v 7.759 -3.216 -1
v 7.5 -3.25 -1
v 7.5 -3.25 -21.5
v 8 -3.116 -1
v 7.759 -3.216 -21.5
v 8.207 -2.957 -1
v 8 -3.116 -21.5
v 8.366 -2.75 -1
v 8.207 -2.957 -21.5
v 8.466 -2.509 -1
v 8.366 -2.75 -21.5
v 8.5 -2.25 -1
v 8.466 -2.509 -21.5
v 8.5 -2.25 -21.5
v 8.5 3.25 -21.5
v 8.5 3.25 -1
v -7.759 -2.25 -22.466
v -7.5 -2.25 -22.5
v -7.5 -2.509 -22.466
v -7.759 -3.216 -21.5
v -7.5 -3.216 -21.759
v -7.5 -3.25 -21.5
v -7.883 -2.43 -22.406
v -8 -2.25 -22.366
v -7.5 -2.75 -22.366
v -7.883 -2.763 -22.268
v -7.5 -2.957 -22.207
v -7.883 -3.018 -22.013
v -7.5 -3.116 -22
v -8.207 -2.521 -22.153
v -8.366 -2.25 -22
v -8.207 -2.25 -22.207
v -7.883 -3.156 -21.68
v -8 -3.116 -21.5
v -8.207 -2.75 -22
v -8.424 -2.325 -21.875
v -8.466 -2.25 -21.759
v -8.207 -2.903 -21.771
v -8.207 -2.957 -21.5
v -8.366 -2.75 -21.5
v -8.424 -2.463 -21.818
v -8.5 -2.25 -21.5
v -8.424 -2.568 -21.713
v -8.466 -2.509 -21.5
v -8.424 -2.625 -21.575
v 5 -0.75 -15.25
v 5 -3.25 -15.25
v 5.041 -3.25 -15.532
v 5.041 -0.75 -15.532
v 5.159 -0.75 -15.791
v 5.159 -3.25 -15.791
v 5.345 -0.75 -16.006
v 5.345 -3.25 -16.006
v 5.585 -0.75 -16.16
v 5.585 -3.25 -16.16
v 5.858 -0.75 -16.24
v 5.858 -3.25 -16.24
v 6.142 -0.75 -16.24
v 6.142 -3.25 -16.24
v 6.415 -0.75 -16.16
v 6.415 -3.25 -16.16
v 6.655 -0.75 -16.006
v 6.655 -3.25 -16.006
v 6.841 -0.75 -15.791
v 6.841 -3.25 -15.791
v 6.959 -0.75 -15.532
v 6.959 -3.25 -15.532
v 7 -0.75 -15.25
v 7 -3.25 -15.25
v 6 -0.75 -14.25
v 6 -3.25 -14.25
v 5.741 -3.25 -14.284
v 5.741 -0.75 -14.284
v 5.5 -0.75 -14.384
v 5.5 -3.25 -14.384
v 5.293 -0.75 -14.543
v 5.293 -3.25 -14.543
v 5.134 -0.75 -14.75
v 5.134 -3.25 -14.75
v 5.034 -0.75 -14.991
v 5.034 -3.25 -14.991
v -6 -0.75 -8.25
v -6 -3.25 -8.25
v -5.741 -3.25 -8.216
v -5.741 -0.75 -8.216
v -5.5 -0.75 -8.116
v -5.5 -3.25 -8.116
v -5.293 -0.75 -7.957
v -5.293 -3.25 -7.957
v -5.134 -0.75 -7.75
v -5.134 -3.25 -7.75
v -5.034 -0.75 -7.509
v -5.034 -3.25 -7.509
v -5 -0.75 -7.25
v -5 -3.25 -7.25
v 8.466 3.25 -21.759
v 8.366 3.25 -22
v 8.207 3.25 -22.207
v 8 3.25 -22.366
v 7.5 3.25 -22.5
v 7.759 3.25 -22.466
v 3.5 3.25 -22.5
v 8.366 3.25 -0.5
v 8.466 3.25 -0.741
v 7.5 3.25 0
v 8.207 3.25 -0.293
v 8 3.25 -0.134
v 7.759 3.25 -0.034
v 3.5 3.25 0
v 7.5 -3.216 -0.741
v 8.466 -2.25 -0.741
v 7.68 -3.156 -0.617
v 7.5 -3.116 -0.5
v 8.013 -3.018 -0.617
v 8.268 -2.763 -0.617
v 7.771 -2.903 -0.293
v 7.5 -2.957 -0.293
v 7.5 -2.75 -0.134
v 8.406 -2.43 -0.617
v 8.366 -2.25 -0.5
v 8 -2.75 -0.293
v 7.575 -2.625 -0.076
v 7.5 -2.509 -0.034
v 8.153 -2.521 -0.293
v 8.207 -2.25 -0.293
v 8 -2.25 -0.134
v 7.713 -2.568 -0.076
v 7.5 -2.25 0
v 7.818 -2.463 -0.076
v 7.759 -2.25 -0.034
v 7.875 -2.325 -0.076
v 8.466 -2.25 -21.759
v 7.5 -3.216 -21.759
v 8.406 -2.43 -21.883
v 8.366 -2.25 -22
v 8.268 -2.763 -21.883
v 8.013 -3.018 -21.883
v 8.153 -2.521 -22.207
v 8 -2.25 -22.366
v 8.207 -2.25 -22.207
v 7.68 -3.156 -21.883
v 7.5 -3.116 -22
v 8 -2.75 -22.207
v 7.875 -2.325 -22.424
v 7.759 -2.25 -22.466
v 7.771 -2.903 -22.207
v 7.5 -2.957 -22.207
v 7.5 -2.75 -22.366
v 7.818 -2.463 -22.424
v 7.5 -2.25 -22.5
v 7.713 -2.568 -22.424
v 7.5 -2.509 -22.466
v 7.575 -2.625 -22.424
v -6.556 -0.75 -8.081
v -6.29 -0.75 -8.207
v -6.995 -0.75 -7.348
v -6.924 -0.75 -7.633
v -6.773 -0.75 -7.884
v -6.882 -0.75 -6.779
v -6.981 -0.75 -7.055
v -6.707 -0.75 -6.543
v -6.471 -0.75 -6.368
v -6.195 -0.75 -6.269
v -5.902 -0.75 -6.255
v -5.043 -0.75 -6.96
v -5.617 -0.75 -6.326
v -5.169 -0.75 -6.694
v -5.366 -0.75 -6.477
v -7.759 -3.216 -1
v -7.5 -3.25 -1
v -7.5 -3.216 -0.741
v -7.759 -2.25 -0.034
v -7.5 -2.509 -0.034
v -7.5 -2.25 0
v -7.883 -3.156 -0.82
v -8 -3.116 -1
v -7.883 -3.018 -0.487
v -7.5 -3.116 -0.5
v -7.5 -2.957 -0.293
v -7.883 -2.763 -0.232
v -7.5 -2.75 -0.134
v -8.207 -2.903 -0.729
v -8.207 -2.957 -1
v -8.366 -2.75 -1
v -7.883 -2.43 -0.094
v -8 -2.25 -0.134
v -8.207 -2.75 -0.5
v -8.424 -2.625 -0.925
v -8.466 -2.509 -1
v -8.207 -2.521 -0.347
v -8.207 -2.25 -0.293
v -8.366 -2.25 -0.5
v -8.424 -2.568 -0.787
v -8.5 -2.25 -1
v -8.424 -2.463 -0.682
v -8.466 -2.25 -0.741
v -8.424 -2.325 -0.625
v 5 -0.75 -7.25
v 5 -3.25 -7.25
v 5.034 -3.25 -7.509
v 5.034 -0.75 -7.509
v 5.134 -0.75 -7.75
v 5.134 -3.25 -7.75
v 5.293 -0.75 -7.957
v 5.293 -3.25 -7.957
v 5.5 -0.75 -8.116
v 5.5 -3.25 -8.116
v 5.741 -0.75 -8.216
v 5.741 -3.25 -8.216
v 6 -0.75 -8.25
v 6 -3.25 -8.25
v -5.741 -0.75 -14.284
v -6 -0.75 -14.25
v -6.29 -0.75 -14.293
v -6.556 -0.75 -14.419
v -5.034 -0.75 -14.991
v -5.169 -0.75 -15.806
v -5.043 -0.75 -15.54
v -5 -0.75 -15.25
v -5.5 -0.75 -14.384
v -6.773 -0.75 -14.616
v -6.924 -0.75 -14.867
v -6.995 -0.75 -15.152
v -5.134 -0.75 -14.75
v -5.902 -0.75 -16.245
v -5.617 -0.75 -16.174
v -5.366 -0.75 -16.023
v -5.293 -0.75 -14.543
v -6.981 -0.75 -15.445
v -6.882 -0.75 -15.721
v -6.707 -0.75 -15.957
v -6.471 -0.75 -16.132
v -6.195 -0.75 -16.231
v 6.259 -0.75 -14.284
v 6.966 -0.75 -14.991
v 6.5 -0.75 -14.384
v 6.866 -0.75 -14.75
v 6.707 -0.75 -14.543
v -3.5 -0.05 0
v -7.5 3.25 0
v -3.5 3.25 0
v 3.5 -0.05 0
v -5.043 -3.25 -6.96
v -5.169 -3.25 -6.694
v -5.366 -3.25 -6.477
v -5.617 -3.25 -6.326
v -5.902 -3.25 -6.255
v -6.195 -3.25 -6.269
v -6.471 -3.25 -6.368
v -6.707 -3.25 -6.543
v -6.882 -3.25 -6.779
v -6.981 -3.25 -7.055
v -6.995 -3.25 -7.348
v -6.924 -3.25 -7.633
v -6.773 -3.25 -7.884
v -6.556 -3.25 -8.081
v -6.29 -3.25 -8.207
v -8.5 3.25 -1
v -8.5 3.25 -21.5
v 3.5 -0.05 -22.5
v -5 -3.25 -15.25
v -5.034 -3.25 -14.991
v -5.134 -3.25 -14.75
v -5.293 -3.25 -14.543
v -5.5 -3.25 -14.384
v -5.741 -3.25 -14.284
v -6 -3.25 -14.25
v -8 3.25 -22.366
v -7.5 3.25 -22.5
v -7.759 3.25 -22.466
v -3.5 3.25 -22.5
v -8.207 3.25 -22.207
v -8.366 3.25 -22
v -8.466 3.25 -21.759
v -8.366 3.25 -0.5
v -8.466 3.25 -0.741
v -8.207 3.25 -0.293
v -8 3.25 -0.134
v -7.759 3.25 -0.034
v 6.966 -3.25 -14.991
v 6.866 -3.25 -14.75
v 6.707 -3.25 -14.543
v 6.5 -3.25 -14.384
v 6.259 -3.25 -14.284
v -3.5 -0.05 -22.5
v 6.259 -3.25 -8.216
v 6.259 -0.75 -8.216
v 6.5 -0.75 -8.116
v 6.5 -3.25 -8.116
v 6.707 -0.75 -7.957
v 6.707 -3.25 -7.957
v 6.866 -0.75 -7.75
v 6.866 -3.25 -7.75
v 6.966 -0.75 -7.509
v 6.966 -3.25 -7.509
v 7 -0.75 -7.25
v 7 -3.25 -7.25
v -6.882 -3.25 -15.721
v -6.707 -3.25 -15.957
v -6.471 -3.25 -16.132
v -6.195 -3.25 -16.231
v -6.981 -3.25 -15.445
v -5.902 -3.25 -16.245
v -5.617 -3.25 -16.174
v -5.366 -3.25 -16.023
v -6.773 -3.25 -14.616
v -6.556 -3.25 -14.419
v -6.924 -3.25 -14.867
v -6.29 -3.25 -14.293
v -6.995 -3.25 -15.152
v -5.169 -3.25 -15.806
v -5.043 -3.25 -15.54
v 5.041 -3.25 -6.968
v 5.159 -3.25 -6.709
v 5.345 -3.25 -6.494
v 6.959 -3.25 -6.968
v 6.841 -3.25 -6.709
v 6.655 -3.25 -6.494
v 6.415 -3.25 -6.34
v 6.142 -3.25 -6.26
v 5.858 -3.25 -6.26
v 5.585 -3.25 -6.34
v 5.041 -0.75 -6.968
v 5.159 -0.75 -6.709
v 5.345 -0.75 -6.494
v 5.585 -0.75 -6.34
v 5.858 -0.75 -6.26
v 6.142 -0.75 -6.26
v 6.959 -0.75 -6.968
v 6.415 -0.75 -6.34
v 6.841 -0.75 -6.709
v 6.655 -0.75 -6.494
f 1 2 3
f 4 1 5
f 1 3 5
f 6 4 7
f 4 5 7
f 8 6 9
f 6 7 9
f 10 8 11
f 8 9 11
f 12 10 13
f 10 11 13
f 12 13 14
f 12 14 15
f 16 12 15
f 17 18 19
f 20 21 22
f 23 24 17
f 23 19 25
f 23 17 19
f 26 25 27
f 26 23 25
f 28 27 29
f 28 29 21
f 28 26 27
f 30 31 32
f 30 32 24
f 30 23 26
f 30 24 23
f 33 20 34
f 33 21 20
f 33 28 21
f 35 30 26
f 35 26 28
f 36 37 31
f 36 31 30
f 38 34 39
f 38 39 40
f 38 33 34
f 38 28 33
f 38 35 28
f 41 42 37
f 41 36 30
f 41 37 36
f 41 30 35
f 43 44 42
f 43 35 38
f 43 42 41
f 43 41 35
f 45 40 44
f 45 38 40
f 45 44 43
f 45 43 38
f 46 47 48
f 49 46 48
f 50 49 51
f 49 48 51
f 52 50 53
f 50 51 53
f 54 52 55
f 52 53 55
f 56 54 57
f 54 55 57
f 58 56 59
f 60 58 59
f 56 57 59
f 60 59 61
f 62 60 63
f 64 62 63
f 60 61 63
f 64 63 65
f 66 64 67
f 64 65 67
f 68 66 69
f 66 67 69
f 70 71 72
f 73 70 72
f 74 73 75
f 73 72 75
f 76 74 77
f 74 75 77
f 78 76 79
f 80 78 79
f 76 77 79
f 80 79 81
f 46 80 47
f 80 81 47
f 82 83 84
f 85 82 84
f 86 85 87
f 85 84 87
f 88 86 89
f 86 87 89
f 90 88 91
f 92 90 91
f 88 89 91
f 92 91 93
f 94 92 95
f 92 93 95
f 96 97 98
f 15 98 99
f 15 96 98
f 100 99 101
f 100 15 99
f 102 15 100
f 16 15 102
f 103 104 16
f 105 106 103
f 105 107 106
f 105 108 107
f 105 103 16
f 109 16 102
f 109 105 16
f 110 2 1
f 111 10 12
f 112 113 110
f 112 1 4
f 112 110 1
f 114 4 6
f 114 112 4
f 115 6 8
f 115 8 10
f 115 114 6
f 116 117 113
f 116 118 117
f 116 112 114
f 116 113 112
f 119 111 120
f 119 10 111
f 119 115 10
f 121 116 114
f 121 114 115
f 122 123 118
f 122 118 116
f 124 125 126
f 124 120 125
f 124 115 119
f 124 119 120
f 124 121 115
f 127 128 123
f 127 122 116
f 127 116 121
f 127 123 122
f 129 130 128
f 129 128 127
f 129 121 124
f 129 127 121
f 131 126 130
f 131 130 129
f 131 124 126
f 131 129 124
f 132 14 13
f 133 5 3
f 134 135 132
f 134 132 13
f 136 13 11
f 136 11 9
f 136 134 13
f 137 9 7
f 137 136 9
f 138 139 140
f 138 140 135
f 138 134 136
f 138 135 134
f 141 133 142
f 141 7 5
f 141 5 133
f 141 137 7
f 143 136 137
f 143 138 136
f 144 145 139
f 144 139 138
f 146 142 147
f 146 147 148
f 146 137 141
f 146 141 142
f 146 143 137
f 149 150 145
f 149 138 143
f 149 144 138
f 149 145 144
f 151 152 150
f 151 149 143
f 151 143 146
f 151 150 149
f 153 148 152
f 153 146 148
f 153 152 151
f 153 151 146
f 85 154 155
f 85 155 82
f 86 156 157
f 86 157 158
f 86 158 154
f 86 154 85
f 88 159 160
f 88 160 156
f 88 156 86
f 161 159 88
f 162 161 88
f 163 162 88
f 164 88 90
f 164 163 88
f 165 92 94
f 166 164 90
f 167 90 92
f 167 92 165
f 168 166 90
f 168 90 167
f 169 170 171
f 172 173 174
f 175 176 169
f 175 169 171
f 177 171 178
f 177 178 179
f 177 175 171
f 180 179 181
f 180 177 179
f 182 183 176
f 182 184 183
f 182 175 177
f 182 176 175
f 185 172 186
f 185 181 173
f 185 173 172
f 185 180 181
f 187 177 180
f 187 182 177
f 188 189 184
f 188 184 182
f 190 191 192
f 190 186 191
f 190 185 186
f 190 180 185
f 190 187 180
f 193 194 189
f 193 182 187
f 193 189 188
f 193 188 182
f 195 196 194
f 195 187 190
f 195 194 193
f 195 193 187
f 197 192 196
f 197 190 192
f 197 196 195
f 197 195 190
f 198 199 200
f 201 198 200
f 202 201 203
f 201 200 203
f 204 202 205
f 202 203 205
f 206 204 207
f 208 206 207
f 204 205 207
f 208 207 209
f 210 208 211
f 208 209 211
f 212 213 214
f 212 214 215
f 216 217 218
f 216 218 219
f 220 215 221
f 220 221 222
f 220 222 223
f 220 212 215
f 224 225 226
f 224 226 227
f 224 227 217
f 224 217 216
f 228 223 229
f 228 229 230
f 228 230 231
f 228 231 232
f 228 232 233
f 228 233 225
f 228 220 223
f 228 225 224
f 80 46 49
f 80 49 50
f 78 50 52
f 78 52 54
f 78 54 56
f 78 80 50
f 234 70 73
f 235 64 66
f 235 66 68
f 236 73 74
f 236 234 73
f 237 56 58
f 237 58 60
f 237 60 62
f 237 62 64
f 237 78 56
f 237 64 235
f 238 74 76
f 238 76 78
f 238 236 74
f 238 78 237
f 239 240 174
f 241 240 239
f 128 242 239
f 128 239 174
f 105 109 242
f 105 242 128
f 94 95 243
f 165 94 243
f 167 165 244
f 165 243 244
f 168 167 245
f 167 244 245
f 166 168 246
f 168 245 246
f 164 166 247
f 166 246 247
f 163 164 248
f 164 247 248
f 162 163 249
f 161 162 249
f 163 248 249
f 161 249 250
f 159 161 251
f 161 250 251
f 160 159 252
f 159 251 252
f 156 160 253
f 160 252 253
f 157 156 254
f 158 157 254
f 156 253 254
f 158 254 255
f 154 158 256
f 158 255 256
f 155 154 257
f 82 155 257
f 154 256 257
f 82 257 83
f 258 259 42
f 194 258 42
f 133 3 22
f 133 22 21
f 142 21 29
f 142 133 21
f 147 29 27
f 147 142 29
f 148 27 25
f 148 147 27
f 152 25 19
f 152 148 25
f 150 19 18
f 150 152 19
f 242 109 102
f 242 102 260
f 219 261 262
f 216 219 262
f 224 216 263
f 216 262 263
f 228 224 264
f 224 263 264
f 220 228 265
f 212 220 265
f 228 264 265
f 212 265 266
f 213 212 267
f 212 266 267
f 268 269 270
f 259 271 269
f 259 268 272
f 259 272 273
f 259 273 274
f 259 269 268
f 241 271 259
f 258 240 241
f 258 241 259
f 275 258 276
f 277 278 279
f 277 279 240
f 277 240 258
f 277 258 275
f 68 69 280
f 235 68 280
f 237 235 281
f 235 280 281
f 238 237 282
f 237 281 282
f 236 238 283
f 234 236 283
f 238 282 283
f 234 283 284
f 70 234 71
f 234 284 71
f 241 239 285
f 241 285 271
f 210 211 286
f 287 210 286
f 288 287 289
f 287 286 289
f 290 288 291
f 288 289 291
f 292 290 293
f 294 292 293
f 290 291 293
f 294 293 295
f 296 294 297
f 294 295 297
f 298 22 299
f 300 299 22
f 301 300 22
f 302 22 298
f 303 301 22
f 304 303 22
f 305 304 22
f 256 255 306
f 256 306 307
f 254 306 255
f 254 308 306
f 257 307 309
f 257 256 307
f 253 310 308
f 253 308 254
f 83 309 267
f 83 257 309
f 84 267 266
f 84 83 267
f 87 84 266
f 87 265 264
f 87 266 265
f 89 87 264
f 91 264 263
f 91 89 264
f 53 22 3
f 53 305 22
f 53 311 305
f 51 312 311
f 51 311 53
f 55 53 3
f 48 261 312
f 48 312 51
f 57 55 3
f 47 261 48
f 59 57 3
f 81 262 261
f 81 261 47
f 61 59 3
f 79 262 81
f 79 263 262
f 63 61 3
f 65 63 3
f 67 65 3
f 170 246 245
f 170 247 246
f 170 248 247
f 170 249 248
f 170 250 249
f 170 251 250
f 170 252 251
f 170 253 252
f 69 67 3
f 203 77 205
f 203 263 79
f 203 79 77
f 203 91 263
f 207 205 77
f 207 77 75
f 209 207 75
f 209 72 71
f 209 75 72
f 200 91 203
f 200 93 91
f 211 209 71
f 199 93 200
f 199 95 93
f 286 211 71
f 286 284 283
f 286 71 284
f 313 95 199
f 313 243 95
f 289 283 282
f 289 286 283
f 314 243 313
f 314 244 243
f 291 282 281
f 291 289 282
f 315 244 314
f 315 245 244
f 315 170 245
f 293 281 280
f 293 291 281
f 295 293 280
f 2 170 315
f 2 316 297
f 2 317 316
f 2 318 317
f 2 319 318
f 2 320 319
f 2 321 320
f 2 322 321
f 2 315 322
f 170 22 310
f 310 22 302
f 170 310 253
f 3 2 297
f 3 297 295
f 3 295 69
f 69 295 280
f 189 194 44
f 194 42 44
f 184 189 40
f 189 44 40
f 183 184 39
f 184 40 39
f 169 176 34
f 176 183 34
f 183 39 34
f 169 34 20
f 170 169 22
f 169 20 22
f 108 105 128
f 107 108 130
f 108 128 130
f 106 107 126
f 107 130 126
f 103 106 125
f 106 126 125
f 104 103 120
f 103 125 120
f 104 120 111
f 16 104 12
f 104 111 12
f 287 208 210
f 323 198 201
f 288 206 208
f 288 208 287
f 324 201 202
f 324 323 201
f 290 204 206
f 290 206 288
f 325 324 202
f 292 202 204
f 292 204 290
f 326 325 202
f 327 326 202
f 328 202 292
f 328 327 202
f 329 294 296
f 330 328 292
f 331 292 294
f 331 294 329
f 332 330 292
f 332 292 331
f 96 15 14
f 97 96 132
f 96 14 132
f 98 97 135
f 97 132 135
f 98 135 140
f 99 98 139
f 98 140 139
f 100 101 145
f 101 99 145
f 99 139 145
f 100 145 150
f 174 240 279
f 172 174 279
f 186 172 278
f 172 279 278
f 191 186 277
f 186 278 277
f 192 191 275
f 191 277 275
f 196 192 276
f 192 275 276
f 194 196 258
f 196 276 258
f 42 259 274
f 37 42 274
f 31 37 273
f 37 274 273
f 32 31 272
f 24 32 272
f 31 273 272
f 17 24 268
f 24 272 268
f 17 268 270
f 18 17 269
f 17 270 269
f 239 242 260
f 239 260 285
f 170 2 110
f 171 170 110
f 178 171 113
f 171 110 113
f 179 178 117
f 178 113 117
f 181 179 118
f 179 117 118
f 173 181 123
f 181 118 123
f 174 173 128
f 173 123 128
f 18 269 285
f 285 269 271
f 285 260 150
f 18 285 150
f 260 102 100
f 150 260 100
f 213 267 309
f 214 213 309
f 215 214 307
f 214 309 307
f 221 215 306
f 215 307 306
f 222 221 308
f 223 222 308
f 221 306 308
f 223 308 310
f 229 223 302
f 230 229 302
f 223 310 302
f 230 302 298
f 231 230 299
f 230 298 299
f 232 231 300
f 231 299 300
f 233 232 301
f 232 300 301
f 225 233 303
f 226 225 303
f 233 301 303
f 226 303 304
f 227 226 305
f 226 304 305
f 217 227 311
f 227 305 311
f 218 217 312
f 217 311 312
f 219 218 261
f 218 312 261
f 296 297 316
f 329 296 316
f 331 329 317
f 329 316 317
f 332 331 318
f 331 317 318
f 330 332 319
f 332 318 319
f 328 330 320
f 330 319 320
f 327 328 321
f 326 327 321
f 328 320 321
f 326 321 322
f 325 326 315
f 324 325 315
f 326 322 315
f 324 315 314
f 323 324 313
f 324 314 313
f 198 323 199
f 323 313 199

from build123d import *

# Parameters (mm, degrees)
EXTRUDE_1_DEPTH     = 22.5
CUT_EXTRUDE_1_DEPTH = 2.5
FILLET_1_R          = 1
FILLET_2_R          = 1


with BuildPart() as part:
    # 草图1 → 凸台-拉伸1 (new body)
    with BuildSketch(Plane.XY):
        Polygon((-8.5, 3.25), (-8.5, -3.25), (8.5, -3.25), (8.5, 3.25), (3.5, 3.25), (3.5, -0.05), (-3.5, -0.05), (-3.5, 3.25), align=None)
    extrude(amount=-EXTRUDE_1_DEPTH)

    # 草图2 → 切除-拉伸1 (cut)
    with BuildSketch(Plane.XZ.offset(3.25)):
        with BuildLine():
            Line((-6, -8.25), (-6, -7.25))
            Line((-6, -7.25), (-5, -7.25))
            ThreePointArc((-5, -7.25), (-6.707106781, -6.542893219), (-6, -8.25))
        make_face()
        with BuildLine():
            Line((-5, -7.25), (-6, -7.25))
            Line((-6, -7.25), (-6, -8.25))
            ThreePointArc((-6, -8.25), (-5.292893219, -7.957106781), (-5, -7.25))
        make_face()
        with BuildLine():
            ThreePointArc((7, -7.25), (6, -6.25), (5, -7.25))
            Line((5, -7.25), (6, -7.25))
            Line((6, -7.25), (6, -8.25))
            ThreePointArc((6, -8.25), (6.707106781, -7.957106781), (7, -7.25))
        make_face()
        with BuildLine():
            Line((6, -7.25), (5, -7.25))
            ThreePointArc((5, -7.25), (5.292893219, -7.957106781), (6, -8.25))
            Line((6, -8.25), (6, -7.25))
        make_face()
        with BuildLine():
            ThreePointArc((7, -15.25), (6.707106781, -14.542893219), (6, -14.25))
            Line((6, -14.25), (6, -15.25))
            Line((6, -15.25), (5, -15.25))
            ThreePointArc((5, -15.25), (6, -16.25), (7, -15.25))
        make_face()
        with BuildLine():
            Line((6, -15.25), (6, -14.25))
            ThreePointArc((6, -14.25), (5.292893219, -14.542893219), (5, -15.25))
            Line((5, -15.25), (6, -15.25))
        make_face()
        with BuildLine():
            ThreePointArc((-5, -15.25), (-5.292893219, -14.542893219), (-6, -14.25))
            Line((-6, -14.25), (-6, -15.25))
            Line((-6, -15.25), (-5, -15.25))
        make_face()
        with BuildLine():
            Line((-6, -15.25), (-6, -14.25))
            ThreePointArc((-6, -14.25), (-6.707106781, -15.957106781), (-5, -15.25))
            Line((-5, -15.25), (-6, -15.25))
        make_face()
    extrude(amount=-CUT_EXTRUDE_1_DEPTH, mode=Mode.SUBTRACT)

    # 圆角1
    fillet_1_edges = [part.edges().sort_by_distance(p)[0] for p in [
        (0, -3.25, 0),
        (8.5, -3.25, -11.25),
        (-8.5, -3.25, -11.25),
        (0, -3.25, -22.5),
    ]]
    fillet(fillet_1_edges, radius=FILLET_1_R)

    # 圆角2
    # the kernel refuses this fillet: 1 mm, written as the material it takes off along each edge
    with BuildSketch(Plane(origin=(-7.5, -2.25, -1), x_dir=(0, 0, 1), z_dir=(-1, 0, 0))) as fillet_2_piece_1_section:
        Polygon((0, 0), (FILLET_2_R, 0), (FILLET_2_R, -FILLET_2_R), (0, -FILLET_2_R), align=None)
    fillet_2_piece_1 = extrude(amount=FILLET_2_R, mode=Mode.PRIVATE)
    fillet_2_piece_1 = fillet_2_piece_1 - Plane(origin=(-7.5, -2.25, -1), x_dir=(0, 0.7071067811865475, -0.7071067811865475), z_dir=(-1, 0, 0)) * Sphere(FILLET_2_R, mode=Mode.PRIVATE)
    add(fillet_2_piece_1, mode=Mode.SUBTRACT)
    with BuildSketch(Plane(origin=(7.5, -2.25, -1), x_dir=(1, 0, 0), z_dir=(0, 0, 1))) as fillet_2_piece_2_section:
        Polygon((0, 0), (FILLET_2_R, 0), (FILLET_2_R, -FILLET_2_R), (0, -FILLET_2_R), align=None)
    fillet_2_piece_2 = extrude(amount=FILLET_2_R, mode=Mode.PRIVATE)
    fillet_2_piece_2 = fillet_2_piece_2 - Plane(origin=(7.5, -2.25, -1), x_dir=(-0.7071067811865475, 0.7071067811865475, 0), z_dir=(0, 0, 1)) * Sphere(FILLET_2_R, mode=Mode.PRIVATE)
    add(fillet_2_piece_2, mode=Mode.SUBTRACT)
    with BuildSketch(Plane(origin=(-7.5, -2.25, -21.5), x_dir=(0, 0, -1), z_dir=(-1, 0, 0))) as fillet_2_piece_3_section:
        Polygon((0, 0), (FILLET_2_R, 0), (FILLET_2_R, FILLET_2_R), (0, FILLET_2_R), align=None)
    fillet_2_piece_3 = extrude(amount=FILLET_2_R, mode=Mode.PRIVATE)
    fillet_2_piece_3 = fillet_2_piece_3 - Plane(origin=(-7.5, -2.25, -21.5), x_dir=(0, 0.7071067811865475, 0.7071067811865475), z_dir=(-1, 0, 0)) * Sphere(FILLET_2_R, mode=Mode.PRIVATE)
    add(fillet_2_piece_3, mode=Mode.SUBTRACT)
    with BuildSketch(Plane(origin=(7.5, -2.25, -21.5), x_dir=(1, 0, 0), z_dir=(0, 0, -1))) as fillet_2_piece_4_section:
        Polygon((0, 0), (FILLET_2_R, 0), (FILLET_2_R, FILLET_2_R), (0, FILLET_2_R), align=None)
    fillet_2_piece_4 = extrude(amount=FILLET_2_R, mode=Mode.PRIVATE)
    fillet_2_piece_4 = fillet_2_piece_4 - Plane(origin=(7.5, -2.25, -21.5), x_dir=(-0.7071067811865475, 0.7071067811865475, 0), z_dir=(0, 0, -1)) * Sphere(FILLET_2_R, mode=Mode.PRIVATE)
    add(fillet_2_piece_4, mode=Mode.SUBTRACT)
    with BuildSketch(Plane(origin=(8.5, -2.25, -22.5), x_dir=(-1, 0, 0), z_dir=(0, 1, 0)), Plane(origin=(-8.5, 5.75, 0), x_dir=(0, 0, -1), z_dir=(0, -1, 0))) as fillet_2_piece_5:
        with BuildLine():
            CenterArc((FILLET_2_R, FILLET_2_R), FILLET_2_R, 180, 90)
            Line((0, FILLET_2_R), (0, 0))
            Line((0, 0), (FILLET_2_R, 0))
        make_face()
    extrude(amount=8, mode=Mode.SUBTRACT)
    with BuildSketch(Plane(origin=(-8.5, 5.75, -22.5), x_dir=(0, 0, 1), z_dir=(0, -1, 0)), Plane(origin=(8.5, -2.25, 0), x_dir=(-1, 0, 0), z_dir=(0, 1, 0))) as fillet_2_piece_6:
        with BuildLine():
            CenterArc((FILLET_2_R, -FILLET_2_R), FILLET_2_R, 90, 90)
            Line((0, -FILLET_2_R), (0, 0))
            Line((0, 0), (FILLET_2_R, 0))
        make_face()
    extrude(amount=8, mode=Mode.SUBTRACT)


solid = part.part
